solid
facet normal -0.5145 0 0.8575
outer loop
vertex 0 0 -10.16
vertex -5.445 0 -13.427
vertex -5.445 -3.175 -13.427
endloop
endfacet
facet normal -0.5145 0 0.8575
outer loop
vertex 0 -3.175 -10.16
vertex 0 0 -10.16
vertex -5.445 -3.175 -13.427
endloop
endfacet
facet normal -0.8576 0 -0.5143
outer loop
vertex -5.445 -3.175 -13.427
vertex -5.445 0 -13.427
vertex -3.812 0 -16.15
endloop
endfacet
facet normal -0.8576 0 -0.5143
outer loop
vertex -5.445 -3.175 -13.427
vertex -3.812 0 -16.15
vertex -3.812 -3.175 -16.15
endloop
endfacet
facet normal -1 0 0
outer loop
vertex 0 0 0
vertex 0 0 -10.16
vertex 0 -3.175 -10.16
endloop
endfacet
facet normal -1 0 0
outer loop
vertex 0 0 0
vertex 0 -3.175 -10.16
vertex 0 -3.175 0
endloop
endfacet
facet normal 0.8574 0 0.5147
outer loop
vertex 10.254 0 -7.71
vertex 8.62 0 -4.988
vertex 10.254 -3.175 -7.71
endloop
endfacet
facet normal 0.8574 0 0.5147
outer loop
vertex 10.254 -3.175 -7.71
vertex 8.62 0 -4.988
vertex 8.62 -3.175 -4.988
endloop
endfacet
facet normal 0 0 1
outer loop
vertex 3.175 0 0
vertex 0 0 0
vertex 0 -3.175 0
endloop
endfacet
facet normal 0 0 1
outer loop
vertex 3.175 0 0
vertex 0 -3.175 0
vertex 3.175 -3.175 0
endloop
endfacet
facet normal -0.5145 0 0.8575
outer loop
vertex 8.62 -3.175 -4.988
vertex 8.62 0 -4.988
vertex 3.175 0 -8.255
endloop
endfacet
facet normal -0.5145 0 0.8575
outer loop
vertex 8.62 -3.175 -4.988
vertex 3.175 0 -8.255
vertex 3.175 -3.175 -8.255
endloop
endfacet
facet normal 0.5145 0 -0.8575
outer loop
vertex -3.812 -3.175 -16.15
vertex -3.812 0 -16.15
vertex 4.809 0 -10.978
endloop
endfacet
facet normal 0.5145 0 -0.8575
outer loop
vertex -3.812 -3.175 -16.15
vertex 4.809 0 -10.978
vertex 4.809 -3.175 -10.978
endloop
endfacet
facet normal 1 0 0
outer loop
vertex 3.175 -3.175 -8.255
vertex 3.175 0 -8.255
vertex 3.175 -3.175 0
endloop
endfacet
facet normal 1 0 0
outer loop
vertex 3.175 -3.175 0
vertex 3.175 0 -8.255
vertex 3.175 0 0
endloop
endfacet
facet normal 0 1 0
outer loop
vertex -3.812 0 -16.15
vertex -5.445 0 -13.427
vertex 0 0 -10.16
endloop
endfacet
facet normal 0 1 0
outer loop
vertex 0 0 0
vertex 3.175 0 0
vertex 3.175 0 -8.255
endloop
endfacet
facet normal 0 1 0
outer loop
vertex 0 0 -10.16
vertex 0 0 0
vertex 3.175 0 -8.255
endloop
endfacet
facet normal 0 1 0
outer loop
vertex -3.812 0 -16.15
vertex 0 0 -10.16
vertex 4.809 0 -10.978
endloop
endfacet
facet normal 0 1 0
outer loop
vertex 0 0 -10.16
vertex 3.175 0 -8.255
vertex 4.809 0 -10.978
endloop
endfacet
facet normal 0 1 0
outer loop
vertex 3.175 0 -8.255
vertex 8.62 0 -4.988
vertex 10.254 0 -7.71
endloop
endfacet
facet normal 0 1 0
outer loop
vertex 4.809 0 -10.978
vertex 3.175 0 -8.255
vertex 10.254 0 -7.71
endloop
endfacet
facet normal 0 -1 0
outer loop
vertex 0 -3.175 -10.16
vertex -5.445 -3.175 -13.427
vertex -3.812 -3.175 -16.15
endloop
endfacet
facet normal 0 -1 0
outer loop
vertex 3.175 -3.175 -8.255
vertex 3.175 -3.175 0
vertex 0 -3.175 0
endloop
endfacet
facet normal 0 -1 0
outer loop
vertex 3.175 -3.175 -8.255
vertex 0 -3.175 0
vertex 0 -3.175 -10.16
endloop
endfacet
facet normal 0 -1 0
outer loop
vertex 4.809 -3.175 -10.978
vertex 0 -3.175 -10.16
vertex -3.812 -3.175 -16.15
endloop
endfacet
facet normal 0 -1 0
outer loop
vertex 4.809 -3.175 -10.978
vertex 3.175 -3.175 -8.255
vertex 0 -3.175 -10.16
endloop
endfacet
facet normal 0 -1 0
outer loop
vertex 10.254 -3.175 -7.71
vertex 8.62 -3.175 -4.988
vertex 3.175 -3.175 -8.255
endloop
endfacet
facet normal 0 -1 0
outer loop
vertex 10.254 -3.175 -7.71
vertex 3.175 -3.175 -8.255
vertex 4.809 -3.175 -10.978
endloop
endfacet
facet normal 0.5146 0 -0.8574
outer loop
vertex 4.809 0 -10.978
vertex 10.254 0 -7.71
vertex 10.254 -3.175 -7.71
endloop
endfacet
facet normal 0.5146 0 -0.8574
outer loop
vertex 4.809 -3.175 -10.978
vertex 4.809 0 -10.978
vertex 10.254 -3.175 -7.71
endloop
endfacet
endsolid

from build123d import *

# Parameters (mm, degrees)
F0_W            = 3.175
F0_H            = 10.16
F1_DEPTH        = 3.175
F2_SIZE2        = 3.17499
F2_SIZE         = 1.90499
F3_DEPTH        = 3.175
F4_DEPTH        = 6.35
F4_COPIES_COUNT = 2
F4_COPIES_PITCH = 10.052646


# Not quite as in the source:
# - a fillet or chamfer is up to 0.001 mm smaller than in the source, because OpenCascade refuses the exact size
# - a feature of the source that left no trace in its solid (it failed there, or was rolled back) is left out
# - a pattern or mirror of a feature is missing from the dataset's text; its kind, count and spacing are read off the source's solid


with BuildPart() as f1:
    # F0 (on Front) → F1 (new body)
    with BuildSketch(Plane.XZ):
        with Locations((1.5875, -5.08)):
            Rectangle(F0_W, F0_H)
    extrude(amount=F1_DEPTH)

    # F2 (size 1.905 and 3.175 in the source; OpenCascade refuses exactly that, so slightly less here)
    f2_edges = [f1.edges().sort_by_distance(p)[0] for p in [
        (3.175, -1.5875, -10.16),
    ]]
    f2_side = f1.faces().sort_by_distance((3.175, -1.5875, -5.08))[0]
    chamfer(f2_edges, length=F2_SIZE, length2=F2_SIZE2, reference=f2_side)


with BuildPart() as f3:
    # F3 (new): a face of the model
    f3_faces = [f1.part.faces().sort_by_distance(p)[0] for p in [
        (1.587505, -1.5875, -9.207505),
    ]]
    extrude(f3_faces, amount=F3_DEPTH)


with BuildPart() as f1_1:
    add(f1.part)

    # F4 (add): a face of the model
    f4_faces = [f3.part.faces().sort_by_distance(p)[0] for p in [
        (0.8167707507, -1.5875, -11.5212707762),
    ]]

    add(f3.part)  # F4 merges F3
    f4 = extrude(f4_faces, amount=F4_DEPTH)

    # F4_copies: F4 ×2
    with Locations(*[Vector(0.8574928129, 0, 0.5144959434) * (i * F4_COPIES_PITCH) for i in range(1, F4_COPIES_COUNT)]):
        add(f4)


solid = f1_1.part
